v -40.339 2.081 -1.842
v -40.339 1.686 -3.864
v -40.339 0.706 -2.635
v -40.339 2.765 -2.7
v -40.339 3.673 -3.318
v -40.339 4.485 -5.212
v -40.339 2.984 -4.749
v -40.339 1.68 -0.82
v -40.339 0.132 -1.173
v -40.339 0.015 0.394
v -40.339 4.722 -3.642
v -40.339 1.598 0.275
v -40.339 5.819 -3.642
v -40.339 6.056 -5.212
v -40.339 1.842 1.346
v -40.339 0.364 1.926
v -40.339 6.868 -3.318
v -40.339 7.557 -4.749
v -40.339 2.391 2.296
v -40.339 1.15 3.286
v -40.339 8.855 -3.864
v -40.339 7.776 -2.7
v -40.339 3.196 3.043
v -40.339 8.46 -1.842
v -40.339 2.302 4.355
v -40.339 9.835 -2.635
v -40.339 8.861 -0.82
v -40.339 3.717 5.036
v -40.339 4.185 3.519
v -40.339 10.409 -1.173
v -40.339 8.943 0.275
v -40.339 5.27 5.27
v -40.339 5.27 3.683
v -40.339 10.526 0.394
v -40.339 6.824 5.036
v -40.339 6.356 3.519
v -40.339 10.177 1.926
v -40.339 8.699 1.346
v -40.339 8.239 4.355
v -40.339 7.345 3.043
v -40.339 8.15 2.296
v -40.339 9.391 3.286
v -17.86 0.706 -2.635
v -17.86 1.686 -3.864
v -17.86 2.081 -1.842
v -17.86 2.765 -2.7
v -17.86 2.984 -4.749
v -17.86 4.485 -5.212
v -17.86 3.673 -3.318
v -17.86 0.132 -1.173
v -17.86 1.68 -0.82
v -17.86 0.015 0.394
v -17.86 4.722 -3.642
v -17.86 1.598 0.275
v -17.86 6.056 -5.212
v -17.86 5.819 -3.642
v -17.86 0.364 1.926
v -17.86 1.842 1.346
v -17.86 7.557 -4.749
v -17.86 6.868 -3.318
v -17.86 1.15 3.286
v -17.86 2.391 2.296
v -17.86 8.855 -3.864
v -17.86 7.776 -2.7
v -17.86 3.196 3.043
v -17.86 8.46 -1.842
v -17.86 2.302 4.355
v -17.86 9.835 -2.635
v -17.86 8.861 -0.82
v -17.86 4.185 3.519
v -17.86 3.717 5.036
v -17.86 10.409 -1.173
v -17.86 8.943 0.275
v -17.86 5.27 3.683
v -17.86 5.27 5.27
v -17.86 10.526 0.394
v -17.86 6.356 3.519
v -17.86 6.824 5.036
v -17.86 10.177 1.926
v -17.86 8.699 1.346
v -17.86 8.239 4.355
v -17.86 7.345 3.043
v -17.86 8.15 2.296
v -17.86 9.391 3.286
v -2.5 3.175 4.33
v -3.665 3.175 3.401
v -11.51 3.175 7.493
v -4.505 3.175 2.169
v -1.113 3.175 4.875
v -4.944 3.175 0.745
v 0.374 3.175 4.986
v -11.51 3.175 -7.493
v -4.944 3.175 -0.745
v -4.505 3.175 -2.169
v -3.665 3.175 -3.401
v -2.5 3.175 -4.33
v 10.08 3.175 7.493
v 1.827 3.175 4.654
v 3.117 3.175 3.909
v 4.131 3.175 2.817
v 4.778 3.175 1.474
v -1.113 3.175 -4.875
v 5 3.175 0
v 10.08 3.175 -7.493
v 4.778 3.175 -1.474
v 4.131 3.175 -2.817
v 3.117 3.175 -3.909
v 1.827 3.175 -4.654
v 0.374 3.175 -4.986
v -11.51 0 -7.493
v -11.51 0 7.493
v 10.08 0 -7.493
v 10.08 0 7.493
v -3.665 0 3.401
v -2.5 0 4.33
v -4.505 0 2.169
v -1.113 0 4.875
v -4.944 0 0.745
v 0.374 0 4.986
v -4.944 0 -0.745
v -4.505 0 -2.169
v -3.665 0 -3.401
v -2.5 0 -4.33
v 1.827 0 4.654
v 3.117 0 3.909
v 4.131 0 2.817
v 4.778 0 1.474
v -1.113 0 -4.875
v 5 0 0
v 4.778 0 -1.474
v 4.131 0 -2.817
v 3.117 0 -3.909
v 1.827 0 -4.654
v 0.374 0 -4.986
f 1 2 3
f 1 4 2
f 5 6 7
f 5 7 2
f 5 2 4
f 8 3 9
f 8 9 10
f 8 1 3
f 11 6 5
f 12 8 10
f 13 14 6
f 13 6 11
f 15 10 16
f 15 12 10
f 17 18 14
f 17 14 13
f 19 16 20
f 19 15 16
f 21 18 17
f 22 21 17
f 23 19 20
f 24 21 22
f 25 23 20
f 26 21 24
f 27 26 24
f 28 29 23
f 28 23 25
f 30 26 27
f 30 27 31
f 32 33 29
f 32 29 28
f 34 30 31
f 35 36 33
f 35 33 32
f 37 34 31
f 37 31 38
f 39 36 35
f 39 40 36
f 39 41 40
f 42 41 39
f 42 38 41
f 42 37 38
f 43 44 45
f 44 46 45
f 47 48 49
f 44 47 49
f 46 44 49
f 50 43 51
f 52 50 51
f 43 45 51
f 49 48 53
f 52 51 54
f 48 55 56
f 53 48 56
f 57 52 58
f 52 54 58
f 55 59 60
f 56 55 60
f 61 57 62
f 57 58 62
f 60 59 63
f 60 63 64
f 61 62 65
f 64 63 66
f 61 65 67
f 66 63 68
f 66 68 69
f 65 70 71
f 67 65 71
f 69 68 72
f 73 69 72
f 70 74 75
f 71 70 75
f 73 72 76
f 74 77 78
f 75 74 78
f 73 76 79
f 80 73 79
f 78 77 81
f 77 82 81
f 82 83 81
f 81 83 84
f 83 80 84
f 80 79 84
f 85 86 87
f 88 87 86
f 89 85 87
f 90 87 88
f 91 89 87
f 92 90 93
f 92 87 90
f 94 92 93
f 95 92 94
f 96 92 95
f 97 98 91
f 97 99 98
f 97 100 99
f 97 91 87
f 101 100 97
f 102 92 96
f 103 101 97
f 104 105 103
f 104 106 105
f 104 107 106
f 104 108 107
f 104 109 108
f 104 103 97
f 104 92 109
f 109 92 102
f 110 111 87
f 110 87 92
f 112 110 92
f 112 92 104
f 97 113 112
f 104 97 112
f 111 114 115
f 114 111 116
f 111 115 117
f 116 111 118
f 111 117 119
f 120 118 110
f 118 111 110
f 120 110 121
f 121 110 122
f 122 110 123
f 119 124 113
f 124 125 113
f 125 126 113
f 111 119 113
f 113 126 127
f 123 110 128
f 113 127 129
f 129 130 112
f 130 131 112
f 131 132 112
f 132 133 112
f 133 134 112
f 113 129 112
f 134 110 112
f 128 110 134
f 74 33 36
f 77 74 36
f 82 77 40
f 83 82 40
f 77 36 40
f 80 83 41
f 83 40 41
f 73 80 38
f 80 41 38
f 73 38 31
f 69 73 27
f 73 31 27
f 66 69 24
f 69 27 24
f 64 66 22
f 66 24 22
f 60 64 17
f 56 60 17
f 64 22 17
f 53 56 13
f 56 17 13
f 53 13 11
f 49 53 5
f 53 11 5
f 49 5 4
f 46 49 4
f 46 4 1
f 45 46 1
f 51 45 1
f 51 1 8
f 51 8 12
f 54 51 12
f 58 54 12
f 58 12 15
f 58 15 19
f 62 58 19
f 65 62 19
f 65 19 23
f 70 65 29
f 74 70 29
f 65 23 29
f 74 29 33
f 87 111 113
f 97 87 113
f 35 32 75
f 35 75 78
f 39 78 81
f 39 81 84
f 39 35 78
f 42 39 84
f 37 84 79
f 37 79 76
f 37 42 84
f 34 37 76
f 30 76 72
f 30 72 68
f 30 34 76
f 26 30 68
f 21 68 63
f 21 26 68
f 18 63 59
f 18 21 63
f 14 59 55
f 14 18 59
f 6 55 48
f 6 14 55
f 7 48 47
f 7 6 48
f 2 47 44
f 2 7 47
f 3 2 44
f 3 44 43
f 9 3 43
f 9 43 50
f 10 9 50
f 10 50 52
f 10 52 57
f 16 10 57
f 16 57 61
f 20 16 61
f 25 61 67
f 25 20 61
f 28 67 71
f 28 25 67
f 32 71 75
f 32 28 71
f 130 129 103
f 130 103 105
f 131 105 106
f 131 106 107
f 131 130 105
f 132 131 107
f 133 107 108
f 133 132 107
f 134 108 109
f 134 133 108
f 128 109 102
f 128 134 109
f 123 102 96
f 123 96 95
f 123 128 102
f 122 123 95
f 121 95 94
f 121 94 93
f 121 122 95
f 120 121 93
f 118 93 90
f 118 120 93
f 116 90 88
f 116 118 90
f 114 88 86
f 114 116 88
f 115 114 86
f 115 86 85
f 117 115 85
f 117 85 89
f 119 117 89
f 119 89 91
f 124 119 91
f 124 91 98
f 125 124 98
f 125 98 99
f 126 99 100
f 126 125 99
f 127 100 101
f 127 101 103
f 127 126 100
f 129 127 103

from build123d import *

# Parameters (mm, degrees)
SKETCH1_W           = 21.59
SKETCH1_H           = 14.986
SKETCH1_R           = 5
BOSS_EXTRUDE1_DEPTH = 3.175
SKETCH2_R           = 5.2705
SKETCH2_R_2         = 3.683
EXTRUDE_THIN1_DEPTH = 22.479


with BuildPart() as part:
    # Sketch1 → Boss-Extrude1 (new body)
    with BuildSketch(Plane(origin=(0, 0, 0), x_dir=(1, 0, 0), z_dir=(0, 1, 0))):
        with Locations((-0.715, 0)):
            Rectangle(SKETCH1_W, SKETCH1_H)
        Circle(SKETCH1_R, mode=Mode.SUBTRACT)
    extrude(amount=BOSS_EXTRUDE1_DEPTH)


with BuildPart() as body_2:
    # Sketch2 → Extrude-Thin1 (new body)
    with BuildSketch(Plane.ZY.offset(40.339)):
        with Locations((0, 5.2705)):
            Circle(SKETCH2_R)
        with Locations((0, 5.2705)):
            Circle(SKETCH2_R_2, mode=Mode.SUBTRACT)
    extrude(amount=-EXTRUDE_THIN1_DEPTH)


solid = Compound([part.part, body_2.part])
